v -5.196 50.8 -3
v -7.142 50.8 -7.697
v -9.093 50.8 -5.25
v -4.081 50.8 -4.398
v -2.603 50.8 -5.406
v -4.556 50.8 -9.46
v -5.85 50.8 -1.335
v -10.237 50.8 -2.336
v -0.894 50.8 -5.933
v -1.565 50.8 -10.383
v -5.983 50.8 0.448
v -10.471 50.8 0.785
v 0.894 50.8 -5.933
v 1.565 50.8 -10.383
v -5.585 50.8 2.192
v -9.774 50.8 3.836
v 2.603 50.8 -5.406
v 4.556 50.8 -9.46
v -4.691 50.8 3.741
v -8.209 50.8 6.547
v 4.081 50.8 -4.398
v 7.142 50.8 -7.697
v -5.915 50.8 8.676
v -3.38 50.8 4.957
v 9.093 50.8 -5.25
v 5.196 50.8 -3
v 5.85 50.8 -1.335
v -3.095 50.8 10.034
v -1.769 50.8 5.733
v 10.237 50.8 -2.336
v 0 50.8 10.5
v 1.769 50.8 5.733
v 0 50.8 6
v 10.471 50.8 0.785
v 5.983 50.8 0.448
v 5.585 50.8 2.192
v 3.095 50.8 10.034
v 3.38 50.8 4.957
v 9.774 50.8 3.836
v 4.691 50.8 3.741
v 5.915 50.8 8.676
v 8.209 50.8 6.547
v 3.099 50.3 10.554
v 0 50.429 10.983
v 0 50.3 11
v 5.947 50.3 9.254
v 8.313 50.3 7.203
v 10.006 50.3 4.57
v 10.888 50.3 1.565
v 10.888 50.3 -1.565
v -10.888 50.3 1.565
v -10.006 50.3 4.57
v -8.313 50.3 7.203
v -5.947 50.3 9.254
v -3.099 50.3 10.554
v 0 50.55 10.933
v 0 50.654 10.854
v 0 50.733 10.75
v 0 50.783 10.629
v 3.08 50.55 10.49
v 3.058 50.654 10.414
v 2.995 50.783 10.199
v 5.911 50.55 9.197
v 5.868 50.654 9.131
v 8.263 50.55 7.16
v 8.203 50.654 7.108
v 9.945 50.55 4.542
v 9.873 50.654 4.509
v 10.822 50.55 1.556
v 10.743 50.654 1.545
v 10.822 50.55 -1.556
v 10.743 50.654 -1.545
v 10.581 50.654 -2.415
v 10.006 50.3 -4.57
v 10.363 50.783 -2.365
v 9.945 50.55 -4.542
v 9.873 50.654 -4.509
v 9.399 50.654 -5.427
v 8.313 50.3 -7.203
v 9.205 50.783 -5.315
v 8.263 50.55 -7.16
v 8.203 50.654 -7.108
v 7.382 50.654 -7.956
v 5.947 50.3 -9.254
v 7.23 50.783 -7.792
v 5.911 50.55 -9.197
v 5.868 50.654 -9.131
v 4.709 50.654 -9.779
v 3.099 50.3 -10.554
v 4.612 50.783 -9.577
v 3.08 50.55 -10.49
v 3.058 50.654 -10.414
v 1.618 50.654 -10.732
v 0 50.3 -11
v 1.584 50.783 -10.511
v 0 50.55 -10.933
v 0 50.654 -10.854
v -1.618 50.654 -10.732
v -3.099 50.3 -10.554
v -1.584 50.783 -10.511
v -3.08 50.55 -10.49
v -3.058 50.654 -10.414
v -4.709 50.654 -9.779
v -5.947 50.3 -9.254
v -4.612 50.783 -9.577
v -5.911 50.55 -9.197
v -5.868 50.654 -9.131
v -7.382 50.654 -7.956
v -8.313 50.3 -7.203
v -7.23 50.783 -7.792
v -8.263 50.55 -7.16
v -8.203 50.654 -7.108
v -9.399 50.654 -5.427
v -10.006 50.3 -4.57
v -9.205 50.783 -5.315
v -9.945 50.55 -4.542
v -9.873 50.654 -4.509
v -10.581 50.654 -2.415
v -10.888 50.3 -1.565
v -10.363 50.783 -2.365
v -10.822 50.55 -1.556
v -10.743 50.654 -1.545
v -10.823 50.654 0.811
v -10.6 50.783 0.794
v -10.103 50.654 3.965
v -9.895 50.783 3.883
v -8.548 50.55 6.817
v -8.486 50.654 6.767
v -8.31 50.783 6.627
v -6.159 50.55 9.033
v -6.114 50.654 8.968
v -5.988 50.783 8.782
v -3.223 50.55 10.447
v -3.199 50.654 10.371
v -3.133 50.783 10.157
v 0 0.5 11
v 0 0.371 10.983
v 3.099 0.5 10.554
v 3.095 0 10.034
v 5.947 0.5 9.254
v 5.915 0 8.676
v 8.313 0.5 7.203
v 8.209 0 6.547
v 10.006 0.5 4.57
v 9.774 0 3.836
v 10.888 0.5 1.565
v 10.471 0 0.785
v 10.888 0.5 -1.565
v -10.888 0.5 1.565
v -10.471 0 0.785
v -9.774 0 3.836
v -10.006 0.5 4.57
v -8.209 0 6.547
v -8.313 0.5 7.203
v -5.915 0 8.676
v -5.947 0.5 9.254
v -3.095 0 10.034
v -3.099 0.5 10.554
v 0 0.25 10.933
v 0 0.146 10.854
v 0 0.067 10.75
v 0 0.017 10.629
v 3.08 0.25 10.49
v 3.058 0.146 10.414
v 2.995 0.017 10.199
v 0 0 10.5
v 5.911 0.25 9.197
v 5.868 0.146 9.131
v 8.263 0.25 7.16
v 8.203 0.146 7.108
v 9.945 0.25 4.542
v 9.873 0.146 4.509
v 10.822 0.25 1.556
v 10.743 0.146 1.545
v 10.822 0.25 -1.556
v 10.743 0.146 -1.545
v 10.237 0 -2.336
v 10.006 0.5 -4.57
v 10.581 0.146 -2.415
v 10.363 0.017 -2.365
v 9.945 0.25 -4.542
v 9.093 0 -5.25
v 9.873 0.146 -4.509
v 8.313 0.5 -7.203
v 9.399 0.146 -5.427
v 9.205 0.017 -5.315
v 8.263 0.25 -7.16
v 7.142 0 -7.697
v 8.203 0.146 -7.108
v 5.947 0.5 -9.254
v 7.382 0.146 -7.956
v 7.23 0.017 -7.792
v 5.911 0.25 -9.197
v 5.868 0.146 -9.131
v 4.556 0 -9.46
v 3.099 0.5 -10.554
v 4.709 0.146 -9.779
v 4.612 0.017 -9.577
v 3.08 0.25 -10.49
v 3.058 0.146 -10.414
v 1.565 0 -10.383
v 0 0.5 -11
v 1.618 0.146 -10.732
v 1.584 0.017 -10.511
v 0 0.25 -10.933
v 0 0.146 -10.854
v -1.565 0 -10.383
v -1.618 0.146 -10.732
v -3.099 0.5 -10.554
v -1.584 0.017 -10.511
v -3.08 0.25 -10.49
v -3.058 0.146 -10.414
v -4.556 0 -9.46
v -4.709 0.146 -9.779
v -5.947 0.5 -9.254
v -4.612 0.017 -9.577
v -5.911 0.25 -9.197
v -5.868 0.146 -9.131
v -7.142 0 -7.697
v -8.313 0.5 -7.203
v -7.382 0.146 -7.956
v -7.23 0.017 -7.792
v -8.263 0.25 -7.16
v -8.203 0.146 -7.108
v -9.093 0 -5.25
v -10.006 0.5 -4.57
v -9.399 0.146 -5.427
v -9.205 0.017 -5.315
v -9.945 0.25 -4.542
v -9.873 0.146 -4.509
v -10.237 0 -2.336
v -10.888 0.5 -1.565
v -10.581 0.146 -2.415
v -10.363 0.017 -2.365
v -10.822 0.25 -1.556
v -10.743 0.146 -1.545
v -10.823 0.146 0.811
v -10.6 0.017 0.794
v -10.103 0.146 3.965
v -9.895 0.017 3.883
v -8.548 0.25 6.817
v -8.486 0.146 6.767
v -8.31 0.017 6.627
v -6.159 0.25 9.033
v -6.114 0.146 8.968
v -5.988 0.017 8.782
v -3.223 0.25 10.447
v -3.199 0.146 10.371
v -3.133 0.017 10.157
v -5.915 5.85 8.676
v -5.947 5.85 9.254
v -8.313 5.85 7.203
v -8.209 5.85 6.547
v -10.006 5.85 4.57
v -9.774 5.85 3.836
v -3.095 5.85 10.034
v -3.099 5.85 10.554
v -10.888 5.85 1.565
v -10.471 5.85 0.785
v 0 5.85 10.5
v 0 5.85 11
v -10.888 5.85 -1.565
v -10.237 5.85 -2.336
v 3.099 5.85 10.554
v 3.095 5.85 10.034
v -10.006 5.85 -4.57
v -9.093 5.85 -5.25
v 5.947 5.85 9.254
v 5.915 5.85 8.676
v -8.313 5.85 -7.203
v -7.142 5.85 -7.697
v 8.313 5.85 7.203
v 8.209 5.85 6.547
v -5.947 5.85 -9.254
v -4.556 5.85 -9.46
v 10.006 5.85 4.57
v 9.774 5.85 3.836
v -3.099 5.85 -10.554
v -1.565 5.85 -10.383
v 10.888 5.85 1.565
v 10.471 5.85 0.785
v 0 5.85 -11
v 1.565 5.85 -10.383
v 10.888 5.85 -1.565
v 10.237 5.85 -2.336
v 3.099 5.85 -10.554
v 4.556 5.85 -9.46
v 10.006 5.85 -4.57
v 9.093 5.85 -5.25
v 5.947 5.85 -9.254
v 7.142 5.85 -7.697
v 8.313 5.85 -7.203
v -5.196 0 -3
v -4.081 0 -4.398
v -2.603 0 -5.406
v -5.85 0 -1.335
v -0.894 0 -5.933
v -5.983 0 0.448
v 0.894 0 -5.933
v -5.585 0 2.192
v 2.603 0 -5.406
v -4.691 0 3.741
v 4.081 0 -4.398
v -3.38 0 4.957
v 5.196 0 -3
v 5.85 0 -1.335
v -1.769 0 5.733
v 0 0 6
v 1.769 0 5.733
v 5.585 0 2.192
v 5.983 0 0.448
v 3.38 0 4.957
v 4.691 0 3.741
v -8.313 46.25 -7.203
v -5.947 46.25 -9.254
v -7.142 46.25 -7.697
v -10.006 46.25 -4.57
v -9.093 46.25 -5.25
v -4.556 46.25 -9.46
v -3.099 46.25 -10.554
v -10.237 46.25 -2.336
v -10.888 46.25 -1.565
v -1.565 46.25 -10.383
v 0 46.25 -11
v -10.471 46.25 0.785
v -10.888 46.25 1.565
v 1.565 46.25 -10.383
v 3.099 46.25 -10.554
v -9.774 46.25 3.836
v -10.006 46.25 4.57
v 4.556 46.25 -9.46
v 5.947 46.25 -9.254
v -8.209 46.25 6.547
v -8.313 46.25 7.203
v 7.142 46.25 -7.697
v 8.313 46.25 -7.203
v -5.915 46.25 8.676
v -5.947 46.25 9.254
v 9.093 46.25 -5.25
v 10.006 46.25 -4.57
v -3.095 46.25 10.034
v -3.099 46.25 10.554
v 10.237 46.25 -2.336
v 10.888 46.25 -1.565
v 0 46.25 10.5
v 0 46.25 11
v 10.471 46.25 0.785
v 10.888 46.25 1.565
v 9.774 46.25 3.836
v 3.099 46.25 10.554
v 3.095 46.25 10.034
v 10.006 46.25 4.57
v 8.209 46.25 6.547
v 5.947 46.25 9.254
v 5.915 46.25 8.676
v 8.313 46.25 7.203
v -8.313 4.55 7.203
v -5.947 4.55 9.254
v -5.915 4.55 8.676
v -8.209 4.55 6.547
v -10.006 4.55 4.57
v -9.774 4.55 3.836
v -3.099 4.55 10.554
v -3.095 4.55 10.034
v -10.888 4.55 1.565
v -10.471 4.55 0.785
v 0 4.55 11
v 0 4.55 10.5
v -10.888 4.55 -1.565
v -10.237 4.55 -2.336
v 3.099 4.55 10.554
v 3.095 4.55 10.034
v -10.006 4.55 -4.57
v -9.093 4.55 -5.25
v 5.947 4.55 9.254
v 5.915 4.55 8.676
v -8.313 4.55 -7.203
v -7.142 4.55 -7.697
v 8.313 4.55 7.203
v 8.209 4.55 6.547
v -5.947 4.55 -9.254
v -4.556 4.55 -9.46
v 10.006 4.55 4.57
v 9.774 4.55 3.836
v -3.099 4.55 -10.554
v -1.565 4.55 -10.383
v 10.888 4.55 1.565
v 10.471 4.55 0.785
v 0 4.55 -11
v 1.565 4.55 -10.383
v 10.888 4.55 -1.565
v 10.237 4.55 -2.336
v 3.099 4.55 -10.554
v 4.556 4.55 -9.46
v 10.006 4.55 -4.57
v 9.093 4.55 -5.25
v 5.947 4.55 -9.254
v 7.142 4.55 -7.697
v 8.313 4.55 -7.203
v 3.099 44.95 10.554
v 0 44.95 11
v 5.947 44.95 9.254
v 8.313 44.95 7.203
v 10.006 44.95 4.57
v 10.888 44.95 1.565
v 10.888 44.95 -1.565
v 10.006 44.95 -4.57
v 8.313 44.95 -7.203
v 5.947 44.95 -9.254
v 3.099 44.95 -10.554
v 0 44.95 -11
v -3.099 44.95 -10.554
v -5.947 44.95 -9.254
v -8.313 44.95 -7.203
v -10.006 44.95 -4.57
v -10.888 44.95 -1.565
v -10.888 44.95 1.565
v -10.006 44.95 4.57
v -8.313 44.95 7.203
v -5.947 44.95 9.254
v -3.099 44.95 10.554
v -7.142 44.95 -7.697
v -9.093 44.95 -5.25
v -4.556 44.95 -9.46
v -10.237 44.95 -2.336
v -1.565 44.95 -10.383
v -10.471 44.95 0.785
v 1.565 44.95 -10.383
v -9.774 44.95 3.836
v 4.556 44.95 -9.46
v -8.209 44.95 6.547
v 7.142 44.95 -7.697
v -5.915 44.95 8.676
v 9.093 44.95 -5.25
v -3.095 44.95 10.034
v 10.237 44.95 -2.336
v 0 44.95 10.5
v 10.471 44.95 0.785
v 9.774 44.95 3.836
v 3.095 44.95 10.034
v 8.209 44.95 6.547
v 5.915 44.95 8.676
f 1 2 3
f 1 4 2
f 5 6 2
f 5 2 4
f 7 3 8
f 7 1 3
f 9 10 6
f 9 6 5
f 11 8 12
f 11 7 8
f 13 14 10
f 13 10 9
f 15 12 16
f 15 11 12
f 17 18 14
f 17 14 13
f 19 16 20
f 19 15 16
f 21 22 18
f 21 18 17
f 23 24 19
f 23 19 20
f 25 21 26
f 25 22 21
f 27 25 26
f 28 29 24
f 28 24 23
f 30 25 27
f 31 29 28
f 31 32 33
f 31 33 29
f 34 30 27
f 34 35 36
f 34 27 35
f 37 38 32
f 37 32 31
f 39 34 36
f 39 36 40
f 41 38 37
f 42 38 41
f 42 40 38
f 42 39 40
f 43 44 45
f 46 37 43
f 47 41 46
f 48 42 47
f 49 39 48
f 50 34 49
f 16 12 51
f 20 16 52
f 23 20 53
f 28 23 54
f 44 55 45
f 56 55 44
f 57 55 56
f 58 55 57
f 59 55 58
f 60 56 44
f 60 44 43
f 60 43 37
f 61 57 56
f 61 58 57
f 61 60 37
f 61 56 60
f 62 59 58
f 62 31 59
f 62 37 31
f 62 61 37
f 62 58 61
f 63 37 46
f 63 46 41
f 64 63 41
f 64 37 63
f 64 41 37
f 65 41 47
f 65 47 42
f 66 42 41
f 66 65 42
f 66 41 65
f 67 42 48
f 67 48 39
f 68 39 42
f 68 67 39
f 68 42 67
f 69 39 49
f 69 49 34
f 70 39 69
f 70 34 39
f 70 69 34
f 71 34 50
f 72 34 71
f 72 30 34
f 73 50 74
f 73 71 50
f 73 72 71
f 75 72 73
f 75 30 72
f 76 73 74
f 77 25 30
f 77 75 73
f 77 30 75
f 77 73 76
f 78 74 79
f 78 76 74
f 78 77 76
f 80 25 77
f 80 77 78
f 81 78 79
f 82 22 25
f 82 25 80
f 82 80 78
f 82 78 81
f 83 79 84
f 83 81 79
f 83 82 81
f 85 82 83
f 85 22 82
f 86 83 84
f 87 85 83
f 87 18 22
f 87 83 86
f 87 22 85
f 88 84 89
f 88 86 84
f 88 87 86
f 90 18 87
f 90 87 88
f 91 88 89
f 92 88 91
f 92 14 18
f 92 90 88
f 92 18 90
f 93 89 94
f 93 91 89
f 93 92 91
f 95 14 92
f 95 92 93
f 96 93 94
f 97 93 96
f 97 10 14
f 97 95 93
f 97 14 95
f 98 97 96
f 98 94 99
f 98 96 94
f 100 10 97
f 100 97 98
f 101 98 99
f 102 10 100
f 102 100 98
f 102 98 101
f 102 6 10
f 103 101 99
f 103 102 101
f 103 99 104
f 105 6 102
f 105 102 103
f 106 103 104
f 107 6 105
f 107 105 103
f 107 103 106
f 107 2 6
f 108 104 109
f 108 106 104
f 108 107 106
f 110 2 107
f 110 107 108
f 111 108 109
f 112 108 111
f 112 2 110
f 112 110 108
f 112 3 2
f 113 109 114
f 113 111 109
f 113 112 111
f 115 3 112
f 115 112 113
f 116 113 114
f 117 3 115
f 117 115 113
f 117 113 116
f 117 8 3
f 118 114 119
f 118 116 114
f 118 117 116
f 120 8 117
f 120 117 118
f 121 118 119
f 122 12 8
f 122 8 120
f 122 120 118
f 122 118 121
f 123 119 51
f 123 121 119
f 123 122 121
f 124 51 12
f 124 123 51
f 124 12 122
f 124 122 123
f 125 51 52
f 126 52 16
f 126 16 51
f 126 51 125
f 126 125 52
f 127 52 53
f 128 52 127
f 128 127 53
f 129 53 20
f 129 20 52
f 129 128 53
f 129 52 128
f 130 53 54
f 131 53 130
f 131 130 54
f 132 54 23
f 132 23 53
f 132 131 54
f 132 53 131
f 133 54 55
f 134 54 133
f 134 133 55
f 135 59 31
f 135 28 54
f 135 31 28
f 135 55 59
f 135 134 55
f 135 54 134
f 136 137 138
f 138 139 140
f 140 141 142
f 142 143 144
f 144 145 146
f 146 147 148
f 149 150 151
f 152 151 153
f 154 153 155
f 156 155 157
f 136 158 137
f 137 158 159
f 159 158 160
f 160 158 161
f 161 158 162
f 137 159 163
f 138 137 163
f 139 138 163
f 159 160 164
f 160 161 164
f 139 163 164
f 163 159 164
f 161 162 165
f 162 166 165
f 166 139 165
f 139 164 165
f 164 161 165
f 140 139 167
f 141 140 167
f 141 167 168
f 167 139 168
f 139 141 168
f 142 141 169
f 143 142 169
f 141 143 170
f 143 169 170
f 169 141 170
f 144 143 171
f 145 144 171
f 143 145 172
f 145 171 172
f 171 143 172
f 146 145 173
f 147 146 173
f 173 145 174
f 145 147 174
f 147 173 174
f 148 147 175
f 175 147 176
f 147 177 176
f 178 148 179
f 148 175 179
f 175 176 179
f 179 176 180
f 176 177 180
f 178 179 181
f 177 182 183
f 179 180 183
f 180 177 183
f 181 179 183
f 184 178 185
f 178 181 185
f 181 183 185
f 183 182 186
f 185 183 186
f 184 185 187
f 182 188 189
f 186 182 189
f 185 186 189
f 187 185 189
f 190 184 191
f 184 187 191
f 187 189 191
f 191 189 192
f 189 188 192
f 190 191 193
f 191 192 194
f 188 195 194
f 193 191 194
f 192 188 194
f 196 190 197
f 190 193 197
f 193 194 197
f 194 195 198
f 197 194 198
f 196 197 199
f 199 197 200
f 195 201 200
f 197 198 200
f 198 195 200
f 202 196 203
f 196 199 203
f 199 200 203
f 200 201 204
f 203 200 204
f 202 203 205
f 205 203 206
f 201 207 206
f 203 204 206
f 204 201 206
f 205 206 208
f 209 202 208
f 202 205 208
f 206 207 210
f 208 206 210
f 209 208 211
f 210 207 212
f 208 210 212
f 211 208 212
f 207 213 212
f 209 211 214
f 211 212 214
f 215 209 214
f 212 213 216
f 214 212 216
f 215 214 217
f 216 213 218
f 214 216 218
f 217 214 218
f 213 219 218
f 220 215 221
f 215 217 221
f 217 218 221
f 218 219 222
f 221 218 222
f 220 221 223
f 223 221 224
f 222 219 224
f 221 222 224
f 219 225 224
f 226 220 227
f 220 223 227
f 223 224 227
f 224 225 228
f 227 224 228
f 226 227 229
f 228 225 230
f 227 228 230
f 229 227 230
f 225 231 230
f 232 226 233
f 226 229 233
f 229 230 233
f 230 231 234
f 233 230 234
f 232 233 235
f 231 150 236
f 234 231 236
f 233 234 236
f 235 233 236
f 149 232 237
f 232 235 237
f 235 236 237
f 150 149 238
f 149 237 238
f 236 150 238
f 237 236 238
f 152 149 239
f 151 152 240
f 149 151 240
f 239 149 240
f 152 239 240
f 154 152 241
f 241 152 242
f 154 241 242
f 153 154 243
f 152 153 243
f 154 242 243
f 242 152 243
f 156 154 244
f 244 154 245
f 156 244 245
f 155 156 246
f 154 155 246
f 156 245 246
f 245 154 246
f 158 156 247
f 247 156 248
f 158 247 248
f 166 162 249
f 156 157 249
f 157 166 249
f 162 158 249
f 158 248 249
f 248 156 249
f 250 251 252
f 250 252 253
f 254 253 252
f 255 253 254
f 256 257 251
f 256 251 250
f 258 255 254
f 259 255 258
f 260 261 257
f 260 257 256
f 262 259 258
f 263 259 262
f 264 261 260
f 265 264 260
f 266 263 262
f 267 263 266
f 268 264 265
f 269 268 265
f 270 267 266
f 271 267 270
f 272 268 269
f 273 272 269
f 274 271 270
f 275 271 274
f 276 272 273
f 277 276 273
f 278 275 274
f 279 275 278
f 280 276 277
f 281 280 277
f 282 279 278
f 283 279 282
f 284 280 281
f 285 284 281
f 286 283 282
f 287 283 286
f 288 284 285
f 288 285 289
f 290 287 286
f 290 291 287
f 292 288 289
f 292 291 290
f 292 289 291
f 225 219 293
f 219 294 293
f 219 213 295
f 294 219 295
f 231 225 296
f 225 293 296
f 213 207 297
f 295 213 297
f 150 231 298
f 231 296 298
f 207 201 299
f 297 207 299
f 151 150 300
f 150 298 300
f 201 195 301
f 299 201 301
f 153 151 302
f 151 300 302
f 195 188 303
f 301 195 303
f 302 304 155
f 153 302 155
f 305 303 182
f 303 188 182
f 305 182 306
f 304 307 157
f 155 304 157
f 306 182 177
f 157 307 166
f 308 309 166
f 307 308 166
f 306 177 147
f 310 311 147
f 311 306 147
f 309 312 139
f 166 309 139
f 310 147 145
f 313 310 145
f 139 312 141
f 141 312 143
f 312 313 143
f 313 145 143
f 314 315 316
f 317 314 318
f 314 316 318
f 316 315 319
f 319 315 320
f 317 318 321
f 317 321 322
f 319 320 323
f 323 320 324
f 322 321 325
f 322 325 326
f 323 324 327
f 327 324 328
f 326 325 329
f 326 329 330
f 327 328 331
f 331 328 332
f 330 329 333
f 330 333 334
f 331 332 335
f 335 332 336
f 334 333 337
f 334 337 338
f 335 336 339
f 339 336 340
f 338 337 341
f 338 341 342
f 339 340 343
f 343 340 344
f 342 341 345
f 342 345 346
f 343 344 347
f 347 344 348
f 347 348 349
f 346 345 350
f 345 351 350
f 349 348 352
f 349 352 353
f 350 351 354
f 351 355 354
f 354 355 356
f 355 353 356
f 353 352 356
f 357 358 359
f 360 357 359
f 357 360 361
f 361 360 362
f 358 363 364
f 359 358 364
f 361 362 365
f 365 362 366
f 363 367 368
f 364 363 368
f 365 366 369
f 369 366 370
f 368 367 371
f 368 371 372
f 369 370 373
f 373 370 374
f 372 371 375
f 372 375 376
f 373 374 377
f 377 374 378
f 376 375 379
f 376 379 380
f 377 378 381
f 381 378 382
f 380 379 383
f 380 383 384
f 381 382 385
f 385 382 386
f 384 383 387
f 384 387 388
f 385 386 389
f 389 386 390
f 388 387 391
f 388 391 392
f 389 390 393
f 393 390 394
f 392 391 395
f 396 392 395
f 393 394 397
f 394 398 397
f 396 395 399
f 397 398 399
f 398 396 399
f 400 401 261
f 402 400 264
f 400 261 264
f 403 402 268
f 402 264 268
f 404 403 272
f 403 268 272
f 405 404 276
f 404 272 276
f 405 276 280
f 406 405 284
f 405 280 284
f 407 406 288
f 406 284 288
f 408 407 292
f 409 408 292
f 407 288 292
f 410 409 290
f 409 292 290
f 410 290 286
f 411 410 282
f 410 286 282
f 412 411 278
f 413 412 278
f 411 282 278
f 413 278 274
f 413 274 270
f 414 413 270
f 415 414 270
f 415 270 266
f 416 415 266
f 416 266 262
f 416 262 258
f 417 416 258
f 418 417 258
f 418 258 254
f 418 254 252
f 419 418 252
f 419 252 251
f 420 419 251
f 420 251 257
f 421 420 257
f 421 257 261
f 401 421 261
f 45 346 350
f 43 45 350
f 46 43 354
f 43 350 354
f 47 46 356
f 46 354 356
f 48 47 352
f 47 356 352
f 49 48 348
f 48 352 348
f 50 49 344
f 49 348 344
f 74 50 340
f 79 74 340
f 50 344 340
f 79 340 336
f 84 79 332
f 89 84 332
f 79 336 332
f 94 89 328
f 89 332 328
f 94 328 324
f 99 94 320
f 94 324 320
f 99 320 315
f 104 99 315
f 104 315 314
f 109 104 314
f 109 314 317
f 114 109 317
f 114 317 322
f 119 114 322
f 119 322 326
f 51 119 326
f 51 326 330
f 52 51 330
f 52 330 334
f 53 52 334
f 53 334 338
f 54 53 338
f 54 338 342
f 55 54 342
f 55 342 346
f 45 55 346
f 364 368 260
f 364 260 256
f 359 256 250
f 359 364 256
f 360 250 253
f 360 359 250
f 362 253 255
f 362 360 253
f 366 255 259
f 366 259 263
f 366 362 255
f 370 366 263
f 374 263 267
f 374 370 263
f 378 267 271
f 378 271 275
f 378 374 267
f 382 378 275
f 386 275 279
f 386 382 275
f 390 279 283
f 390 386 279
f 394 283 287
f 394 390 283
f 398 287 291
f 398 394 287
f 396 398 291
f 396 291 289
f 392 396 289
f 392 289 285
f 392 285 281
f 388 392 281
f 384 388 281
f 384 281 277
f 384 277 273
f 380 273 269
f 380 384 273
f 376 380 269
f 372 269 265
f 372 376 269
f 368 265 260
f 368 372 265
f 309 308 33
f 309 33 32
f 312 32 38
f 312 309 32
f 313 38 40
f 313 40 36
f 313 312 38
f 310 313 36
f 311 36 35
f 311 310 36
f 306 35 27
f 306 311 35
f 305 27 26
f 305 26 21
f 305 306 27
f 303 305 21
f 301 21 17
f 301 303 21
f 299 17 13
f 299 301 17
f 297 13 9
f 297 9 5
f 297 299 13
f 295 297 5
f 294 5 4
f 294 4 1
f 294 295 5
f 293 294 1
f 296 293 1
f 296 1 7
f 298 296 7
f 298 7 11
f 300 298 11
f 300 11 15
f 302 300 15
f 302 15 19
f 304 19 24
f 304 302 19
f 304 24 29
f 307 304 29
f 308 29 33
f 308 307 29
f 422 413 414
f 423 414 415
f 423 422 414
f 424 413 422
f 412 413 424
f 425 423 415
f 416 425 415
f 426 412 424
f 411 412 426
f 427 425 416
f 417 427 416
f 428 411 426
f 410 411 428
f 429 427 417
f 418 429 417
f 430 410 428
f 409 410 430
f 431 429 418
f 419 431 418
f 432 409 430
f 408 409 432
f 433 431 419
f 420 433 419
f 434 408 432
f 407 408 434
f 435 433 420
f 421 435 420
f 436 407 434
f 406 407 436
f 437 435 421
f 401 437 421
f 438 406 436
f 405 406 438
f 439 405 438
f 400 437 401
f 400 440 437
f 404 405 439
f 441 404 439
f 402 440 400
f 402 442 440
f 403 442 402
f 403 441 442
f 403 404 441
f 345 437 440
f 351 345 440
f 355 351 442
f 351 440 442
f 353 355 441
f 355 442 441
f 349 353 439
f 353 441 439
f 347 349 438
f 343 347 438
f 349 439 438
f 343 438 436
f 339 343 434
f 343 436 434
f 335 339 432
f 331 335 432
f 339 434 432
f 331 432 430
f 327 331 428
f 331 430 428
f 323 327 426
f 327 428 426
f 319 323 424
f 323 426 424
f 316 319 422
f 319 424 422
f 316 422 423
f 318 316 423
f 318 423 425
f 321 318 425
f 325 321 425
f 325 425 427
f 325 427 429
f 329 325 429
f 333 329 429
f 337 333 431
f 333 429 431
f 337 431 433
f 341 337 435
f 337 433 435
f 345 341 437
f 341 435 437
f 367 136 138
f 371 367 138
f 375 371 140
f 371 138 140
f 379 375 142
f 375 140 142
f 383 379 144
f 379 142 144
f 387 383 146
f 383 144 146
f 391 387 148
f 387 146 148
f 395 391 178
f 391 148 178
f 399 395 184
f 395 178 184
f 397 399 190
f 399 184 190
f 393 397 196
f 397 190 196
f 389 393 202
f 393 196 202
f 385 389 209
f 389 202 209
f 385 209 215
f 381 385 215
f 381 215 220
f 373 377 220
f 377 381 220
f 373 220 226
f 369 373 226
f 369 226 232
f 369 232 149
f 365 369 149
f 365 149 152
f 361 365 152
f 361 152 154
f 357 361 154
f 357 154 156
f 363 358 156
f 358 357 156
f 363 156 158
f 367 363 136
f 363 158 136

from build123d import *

# Parameters (mm, degrees)
ESBO_O1_R                = 11
ESBO_O1_R_2              = 6
RESSALTO_EXTRUS_O1_DEPTH = 50.8
CORTE_EXTRUS_O1_START    = -5.85
ESBO_O2_R                = 11
ESBO_O2_R_2              = 10.5
CORTE_EXTRUS_O1_DEPTH    = 1.3
CORTE_EXTRUS_O2_START    = -4.55
ESBO_O3_R                = 11
ESBO_O3_R_2              = 10.5
CORTE_EXTRUS_O2_DEPTH    = 1.3
FILETE1_R                = 0.5


with BuildPart() as part:
    # Esboço1 → Ressalto-extrusão1 (new body)
    with BuildSketch(Plane(origin=(0, 0, 0), x_dir=(1, 0, 0), z_dir=(0, 1, 0))):
        with Locations(Location((0, 0, 0), (0, 0, 270))):
            Circle(ESBO_O1_R)
        with Locations(Location((0, 0, 0), (0, 0, 270))):
            Circle(ESBO_O1_R_2, mode=Mode.SUBTRACT)
    extrude(amount=RESSALTO_EXTRUS_O1_DEPTH)

    # Esboço2 → Corte-extrusão1 (cut)
    with BuildSketch(Plane(origin=(0, 50.8, 0), x_dir=(1, 0, 0), z_dir=(0, 1, 0)).offset(CORTE_EXTRUS_O1_START)):
        with Locations(Location((0, 0, 0), (0, 0, 270))):
            Circle(ESBO_O2_R)
        with Locations(Location((0, 0, 0), (0, 0, 270))):
            Circle(ESBO_O2_R_2, mode=Mode.SUBTRACT)
    extrude(amount=CORTE_EXTRUS_O1_DEPTH, mode=Mode.SUBTRACT)

    # Esboço3 → Corte-extrusão2 (cut)
    with BuildSketch(Plane.XZ.offset(CORTE_EXTRUS_O2_START)):
        with Locations(Location((0, 0, 0), (0, 0, 270))):
            Circle(ESBO_O3_R)
        with Locations(Location((0, 0, 0), (0, 0, 90))):
            Circle(ESBO_O3_R_2, mode=Mode.SUBTRACT)
    extrude(amount=-CORTE_EXTRUS_O2_DEPTH, mode=Mode.SUBTRACT)

    # Filete1
    filete1_edges = [part.edges().sort_by_distance(p)[0] for p in [
        (0, 0, -11),
        (0, 50.8, -11),
    ]]
    fillet(filete1_edges, radius=FILETE1_R)


solid = part.part
